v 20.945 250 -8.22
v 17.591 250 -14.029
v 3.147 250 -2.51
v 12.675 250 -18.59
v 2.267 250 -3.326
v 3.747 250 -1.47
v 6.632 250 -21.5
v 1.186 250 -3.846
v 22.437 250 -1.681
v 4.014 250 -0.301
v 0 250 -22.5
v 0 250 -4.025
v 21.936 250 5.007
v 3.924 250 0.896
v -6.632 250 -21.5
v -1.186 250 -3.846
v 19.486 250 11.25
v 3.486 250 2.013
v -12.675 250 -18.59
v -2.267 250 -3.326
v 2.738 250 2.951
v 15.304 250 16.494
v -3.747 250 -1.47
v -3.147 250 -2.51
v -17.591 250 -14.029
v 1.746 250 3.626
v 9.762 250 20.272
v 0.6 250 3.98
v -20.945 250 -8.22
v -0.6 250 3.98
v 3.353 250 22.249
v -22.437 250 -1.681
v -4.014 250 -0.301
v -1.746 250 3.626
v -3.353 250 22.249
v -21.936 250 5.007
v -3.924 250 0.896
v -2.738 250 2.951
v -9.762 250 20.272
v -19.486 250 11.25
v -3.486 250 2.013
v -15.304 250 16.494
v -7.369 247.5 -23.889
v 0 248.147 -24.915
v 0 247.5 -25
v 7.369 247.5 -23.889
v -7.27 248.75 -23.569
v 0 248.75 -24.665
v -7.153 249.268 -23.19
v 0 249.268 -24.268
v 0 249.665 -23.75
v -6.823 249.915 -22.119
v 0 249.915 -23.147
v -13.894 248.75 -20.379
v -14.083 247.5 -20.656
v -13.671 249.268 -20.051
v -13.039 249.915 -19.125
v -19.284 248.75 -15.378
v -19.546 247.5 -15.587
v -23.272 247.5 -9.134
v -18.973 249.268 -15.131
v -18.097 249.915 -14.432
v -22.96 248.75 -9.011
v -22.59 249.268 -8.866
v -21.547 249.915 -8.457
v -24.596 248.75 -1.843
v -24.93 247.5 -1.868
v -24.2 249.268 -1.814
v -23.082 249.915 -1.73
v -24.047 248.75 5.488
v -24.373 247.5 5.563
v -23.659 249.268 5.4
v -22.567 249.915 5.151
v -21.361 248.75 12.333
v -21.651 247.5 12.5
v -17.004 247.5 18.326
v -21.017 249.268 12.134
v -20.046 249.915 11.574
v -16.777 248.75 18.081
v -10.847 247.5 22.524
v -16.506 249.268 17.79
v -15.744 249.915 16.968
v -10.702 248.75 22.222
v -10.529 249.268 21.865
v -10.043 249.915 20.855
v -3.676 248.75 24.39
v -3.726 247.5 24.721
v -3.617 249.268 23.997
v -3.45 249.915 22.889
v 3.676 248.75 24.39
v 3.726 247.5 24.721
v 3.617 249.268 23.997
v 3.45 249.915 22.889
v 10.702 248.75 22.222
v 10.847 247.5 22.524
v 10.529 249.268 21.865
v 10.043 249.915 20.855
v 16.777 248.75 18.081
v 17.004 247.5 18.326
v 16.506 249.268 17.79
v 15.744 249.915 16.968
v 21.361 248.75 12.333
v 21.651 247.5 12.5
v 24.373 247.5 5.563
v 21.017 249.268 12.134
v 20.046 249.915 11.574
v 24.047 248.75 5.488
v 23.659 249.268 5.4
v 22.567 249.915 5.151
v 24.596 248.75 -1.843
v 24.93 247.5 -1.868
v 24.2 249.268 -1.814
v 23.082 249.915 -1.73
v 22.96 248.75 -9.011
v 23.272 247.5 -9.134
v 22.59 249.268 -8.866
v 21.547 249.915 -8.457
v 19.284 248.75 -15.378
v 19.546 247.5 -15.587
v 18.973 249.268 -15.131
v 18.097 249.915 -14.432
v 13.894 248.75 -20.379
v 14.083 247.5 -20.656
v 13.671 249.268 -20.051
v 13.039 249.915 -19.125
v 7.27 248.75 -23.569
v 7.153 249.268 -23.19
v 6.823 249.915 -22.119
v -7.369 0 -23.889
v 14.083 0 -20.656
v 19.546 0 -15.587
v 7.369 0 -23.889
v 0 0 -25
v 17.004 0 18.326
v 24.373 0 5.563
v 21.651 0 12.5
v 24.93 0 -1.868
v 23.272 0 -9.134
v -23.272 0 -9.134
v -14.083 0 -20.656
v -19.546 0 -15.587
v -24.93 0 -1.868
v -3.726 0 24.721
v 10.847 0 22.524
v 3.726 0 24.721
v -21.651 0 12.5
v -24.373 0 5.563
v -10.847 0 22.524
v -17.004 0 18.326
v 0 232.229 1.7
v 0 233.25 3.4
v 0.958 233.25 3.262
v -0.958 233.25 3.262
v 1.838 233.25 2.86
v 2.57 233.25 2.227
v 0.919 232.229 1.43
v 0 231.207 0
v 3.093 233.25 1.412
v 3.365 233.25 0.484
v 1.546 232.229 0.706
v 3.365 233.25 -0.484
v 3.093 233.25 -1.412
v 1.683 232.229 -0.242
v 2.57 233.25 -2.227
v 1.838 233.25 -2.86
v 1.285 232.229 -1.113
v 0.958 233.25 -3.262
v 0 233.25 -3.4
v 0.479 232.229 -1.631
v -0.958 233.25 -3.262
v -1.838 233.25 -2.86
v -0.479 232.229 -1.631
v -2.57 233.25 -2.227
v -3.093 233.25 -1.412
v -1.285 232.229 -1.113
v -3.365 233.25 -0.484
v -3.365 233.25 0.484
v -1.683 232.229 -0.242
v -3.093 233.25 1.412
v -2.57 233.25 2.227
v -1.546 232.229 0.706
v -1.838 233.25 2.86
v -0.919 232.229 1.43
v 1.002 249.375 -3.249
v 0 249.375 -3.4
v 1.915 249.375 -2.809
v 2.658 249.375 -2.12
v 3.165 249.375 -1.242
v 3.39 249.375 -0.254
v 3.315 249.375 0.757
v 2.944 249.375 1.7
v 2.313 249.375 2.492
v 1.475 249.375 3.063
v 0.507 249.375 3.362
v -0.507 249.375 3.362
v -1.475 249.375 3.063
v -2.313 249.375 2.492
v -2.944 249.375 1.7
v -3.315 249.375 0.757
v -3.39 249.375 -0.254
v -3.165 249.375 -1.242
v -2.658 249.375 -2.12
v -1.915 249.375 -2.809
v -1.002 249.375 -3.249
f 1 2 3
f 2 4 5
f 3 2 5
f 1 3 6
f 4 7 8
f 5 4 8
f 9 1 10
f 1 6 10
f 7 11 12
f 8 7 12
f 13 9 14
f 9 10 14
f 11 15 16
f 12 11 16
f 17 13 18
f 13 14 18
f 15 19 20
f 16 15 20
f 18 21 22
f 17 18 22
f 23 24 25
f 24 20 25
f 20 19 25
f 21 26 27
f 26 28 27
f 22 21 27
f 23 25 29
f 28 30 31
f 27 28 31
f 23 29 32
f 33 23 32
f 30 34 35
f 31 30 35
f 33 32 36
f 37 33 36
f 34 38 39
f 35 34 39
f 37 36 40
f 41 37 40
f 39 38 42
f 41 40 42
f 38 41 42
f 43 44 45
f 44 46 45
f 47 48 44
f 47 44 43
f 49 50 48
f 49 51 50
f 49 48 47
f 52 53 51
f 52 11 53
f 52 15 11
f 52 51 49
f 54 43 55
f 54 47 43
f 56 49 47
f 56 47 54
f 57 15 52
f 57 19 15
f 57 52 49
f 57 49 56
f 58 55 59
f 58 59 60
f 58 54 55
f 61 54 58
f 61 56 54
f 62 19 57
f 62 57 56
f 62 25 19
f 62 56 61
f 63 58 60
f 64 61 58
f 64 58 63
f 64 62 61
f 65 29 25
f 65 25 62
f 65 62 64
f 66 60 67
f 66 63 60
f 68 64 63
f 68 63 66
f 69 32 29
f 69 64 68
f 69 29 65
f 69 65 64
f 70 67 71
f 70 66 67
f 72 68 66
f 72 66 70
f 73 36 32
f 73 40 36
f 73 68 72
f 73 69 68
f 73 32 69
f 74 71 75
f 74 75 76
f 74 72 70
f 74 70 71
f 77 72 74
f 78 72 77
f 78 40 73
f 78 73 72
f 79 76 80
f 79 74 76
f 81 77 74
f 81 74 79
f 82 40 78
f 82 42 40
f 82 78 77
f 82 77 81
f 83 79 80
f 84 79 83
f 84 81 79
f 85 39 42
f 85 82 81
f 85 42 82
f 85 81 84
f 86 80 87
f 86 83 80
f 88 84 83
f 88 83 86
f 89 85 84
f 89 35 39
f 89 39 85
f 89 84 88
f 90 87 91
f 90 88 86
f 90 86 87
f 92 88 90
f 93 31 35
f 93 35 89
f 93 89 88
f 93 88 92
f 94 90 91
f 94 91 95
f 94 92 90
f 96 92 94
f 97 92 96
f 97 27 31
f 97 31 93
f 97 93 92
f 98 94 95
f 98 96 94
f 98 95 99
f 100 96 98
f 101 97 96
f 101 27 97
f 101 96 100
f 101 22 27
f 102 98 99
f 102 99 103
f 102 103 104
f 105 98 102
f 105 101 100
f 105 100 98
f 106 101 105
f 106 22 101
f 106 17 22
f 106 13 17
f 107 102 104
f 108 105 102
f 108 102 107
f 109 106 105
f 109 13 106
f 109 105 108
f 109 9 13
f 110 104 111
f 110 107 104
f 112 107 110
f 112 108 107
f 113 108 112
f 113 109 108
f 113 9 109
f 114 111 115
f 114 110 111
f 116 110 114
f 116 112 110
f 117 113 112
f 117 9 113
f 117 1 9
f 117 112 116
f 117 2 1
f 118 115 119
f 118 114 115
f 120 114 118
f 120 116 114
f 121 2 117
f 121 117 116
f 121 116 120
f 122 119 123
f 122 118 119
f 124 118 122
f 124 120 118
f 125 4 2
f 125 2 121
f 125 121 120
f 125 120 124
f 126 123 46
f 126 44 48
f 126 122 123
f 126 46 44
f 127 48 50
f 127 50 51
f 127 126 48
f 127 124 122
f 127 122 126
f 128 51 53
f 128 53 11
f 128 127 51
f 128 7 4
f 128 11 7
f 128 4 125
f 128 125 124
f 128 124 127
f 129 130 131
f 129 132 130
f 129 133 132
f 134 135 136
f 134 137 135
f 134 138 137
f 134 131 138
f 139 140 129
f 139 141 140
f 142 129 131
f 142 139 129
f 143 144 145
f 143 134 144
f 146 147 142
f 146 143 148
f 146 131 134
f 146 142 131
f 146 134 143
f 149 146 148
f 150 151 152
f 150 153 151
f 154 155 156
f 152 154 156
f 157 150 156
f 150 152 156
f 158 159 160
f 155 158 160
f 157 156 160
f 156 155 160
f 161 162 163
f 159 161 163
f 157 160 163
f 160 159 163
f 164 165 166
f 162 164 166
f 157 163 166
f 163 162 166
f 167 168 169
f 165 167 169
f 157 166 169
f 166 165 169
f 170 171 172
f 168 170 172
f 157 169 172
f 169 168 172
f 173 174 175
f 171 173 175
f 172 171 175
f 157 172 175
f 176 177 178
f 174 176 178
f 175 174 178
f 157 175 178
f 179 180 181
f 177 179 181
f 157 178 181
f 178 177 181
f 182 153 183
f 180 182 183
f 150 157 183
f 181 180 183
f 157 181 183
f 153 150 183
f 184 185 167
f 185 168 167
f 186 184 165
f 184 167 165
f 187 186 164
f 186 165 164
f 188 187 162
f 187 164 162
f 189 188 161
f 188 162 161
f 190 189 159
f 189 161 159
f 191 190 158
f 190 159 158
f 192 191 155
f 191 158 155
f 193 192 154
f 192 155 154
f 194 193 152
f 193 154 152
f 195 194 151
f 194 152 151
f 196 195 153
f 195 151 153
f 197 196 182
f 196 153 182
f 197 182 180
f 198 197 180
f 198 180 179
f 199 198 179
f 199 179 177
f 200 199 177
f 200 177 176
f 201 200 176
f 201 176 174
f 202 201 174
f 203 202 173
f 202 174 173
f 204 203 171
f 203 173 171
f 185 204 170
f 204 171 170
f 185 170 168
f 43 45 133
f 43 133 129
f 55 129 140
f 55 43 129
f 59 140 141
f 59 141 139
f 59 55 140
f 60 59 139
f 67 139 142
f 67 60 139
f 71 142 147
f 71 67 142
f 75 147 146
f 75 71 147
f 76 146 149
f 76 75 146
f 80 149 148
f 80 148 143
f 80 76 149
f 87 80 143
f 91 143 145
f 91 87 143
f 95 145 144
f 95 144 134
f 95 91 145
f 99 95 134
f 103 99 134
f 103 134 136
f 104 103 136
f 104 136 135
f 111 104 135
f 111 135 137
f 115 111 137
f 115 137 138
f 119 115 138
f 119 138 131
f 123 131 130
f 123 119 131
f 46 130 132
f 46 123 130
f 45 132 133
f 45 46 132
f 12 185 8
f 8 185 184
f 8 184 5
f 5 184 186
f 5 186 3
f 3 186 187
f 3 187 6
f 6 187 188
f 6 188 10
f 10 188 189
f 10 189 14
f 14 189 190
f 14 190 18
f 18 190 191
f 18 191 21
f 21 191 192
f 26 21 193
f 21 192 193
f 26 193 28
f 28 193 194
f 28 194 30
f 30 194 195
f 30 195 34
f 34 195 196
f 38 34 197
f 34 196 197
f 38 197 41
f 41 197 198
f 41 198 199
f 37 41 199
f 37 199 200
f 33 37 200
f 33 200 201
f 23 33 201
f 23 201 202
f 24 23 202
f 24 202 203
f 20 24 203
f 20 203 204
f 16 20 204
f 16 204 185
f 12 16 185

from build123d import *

# Parameters (mm, degrees)
SKETCH1_W                   = 25
SKETCH1_H                   = 250
M8_TAPPED_HOLE1_D           = 6.8
M8_TAPPED_HOLE1_DEPTH       = 16.75
M8_TAPPED_HOLE1_CSINK_D     = 8.05
M8_TAPPED_HOLE1_CSINK_ANGLE = 90
M8_TAPPED_HOLE1_TIP         = 2.042926105
FILLET1_R                   = 2.5


with BuildPart() as part:
    # Sketch1 → Revolve1 (revolve)
    with BuildSketch(Plane.XY, mode=Mode.PRIVATE) as revolve1_sk:
        with Locations((12.5, 125)):
            Rectangle(SKETCH1_W, SKETCH1_H)
    revolve(revolve1_sk.sketch.rotate(Axis((0, 0, 0), (0, 1, 0)), 90), axis=Axis((0, 0, 0), (0, 1, 0)))

    # M8 Tapped Hole1
    with Locations(Plane.ZX.offset(250)):
        with Locations((0, 0)):
            CounterSinkHole(M8_TAPPED_HOLE1_D / 2, M8_TAPPED_HOLE1_CSINK_D / 2, depth=M8_TAPPED_HOLE1_DEPTH, counter_sink_angle=M8_TAPPED_HOLE1_CSINK_ANGLE)
            with Locations((0, 0, -(M8_TAPPED_HOLE1_DEPTH + M8_TAPPED_HOLE1_TIP / 2))):  # 118° drill point
                Cone(0, M8_TAPPED_HOLE1_D / 2, M8_TAPPED_HOLE1_TIP, mode=Mode.SUBTRACT)

    # Fillet1
    fillet1_edges = [part.edges().sort_by_distance(p)[0] for p in [
        (0, 250, 25),
    ]]
    fillet(fillet1_edges, radius=FILLET1_R)


solid = part.part
